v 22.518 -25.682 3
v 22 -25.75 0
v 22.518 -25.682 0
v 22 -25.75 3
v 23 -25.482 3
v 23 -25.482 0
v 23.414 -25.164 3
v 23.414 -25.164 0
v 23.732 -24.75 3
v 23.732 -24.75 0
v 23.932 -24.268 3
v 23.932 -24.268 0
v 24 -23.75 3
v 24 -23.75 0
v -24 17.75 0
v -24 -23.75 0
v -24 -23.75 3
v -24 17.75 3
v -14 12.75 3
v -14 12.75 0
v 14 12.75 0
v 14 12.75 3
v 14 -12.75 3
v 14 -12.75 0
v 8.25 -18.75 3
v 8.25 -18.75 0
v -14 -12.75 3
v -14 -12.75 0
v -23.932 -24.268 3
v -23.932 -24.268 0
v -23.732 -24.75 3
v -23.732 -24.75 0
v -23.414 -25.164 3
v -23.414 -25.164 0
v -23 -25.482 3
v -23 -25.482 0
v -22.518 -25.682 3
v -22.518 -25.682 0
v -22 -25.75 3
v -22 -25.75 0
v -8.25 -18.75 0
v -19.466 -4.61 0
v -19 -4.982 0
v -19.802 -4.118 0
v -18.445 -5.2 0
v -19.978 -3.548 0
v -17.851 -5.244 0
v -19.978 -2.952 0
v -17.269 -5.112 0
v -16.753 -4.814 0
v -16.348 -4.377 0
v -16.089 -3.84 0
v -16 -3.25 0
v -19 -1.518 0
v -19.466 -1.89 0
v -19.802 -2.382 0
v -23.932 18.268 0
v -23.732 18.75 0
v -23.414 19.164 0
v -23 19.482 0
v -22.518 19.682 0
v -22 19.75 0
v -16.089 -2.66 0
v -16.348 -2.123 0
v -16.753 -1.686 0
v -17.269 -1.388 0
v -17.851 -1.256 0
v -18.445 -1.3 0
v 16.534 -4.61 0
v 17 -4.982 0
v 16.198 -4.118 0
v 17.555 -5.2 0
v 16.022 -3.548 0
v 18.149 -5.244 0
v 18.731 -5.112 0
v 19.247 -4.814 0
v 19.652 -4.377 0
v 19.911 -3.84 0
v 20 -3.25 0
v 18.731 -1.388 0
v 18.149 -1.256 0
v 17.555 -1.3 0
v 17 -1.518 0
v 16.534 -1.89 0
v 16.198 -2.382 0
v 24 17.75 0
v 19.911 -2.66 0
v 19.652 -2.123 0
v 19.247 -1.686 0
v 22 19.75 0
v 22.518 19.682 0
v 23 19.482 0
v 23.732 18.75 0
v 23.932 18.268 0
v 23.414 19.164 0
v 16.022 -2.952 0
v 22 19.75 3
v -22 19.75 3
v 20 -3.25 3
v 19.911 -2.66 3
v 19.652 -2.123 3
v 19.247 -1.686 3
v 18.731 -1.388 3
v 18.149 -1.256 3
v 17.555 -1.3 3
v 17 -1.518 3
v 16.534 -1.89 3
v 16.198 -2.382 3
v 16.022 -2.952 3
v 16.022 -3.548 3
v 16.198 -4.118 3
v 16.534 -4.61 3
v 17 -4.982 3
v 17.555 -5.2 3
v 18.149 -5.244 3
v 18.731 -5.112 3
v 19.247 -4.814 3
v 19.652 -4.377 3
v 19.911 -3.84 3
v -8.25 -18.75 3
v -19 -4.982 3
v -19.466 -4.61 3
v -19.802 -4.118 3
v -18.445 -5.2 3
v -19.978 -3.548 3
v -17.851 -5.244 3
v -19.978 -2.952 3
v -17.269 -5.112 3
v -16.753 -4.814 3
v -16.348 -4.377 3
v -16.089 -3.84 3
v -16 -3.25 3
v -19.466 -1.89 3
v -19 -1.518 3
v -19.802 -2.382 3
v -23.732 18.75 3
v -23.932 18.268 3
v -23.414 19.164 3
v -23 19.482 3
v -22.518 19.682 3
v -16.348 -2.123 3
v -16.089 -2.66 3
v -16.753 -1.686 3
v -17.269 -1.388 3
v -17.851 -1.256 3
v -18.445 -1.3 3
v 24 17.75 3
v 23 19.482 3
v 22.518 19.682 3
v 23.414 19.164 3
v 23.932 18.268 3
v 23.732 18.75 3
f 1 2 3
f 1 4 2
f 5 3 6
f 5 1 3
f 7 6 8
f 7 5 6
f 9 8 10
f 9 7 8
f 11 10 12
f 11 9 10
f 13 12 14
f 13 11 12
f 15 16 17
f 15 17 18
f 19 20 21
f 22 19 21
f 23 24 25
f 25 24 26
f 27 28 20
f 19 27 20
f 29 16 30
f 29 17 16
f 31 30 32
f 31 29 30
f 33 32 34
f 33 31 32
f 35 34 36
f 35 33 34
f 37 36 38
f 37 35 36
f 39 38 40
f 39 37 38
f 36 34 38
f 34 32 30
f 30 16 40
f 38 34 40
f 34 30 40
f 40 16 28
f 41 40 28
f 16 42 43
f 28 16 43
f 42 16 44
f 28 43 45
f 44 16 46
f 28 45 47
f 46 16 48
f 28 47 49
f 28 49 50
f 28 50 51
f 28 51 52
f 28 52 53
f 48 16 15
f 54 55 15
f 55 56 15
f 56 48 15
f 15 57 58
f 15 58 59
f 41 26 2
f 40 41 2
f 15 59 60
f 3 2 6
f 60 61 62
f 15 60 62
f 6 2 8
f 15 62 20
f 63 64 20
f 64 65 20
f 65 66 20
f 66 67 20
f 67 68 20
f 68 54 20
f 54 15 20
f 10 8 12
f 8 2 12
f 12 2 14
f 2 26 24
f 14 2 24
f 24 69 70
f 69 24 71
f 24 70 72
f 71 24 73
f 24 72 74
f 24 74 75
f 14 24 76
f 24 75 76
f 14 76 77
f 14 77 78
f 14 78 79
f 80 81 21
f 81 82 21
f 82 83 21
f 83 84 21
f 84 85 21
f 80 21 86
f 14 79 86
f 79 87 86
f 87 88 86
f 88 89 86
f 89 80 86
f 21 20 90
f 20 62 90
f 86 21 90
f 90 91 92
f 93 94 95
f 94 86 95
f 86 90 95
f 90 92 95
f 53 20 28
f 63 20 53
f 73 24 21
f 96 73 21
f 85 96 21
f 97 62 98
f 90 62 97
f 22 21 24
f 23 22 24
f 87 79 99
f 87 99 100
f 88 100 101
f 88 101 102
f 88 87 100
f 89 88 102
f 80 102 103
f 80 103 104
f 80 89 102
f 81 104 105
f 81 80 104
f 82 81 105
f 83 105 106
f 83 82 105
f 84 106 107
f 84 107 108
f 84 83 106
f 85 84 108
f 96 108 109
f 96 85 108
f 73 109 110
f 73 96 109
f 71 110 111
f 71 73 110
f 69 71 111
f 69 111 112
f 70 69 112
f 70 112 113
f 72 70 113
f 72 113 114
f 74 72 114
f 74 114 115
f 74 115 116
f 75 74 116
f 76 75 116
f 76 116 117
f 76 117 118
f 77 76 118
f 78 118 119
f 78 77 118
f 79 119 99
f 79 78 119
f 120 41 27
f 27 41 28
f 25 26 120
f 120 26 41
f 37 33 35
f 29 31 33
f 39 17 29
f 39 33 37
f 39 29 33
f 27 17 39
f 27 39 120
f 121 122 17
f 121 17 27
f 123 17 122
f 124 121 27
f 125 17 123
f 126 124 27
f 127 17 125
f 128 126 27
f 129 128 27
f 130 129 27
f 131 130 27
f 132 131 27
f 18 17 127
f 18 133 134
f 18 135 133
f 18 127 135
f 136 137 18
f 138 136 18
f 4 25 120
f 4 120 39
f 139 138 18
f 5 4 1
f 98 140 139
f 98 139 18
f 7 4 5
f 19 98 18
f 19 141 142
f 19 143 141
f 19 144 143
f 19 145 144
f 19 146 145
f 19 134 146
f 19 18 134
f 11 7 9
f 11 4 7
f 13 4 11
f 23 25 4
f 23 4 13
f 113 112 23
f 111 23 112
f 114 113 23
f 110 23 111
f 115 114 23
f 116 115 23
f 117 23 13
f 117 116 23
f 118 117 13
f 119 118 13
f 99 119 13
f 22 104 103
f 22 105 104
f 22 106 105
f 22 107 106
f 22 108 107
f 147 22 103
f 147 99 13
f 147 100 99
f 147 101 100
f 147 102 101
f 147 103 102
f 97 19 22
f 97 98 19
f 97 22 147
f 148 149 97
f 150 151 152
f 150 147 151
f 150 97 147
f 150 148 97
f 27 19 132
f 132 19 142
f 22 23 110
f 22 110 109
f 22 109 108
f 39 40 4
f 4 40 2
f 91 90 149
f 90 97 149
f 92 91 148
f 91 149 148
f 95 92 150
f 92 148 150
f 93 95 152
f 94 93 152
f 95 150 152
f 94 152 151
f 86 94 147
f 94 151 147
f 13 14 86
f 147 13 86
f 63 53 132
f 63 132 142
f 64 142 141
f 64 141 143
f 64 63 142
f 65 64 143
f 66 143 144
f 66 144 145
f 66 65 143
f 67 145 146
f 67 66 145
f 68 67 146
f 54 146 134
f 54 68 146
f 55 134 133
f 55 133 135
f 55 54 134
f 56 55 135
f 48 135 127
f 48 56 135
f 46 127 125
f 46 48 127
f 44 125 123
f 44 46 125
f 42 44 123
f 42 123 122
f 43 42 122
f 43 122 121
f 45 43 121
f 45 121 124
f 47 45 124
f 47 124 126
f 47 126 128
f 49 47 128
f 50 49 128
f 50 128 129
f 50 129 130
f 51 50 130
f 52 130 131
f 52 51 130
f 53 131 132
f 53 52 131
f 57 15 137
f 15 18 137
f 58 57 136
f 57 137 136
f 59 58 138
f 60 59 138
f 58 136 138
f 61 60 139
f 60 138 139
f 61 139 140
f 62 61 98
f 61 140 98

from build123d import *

# Parameters (mm, degrees)
SKETCH_W  = 48
SKETCH_H  = 45.5
SKETCH_R  = 2
PAD_DEPTH = 3
FILLET_R  = 2


with BuildPart() as part:
    # Sketch → Pad (new body)
    with BuildSketch(Plane.XY):
        with Locations((0, -3)):
            Rectangle(SKETCH_W, SKETCH_H)
        with Locations((-18, -3.25)):
            Circle(SKETCH_R, mode=Mode.SUBTRACT)
        with Locations((18, -3.25)):
            Circle(SKETCH_R, mode=Mode.SUBTRACT)
        Polygon((-14, 12.75), (14, 12.75), (14, -12.75), (8.25, -18.75), (-8.25, -18.75), (-14, -12.75), align=None, mode=Mode.SUBTRACT)
    extrude(amount=PAD_DEPTH)

    # Fillet
    fillet_edges = [part.edges().sort_by_distance(p)[0] for p in [
        (-24, -25.75, 1.5),
        (24, -25.75, 1.5),
        (24, 19.75, 1.5),
        (-24, 19.75, 1.5),
    ]]
    fillet(fillet_edges, radius=FILLET_R)


solid = part.part
